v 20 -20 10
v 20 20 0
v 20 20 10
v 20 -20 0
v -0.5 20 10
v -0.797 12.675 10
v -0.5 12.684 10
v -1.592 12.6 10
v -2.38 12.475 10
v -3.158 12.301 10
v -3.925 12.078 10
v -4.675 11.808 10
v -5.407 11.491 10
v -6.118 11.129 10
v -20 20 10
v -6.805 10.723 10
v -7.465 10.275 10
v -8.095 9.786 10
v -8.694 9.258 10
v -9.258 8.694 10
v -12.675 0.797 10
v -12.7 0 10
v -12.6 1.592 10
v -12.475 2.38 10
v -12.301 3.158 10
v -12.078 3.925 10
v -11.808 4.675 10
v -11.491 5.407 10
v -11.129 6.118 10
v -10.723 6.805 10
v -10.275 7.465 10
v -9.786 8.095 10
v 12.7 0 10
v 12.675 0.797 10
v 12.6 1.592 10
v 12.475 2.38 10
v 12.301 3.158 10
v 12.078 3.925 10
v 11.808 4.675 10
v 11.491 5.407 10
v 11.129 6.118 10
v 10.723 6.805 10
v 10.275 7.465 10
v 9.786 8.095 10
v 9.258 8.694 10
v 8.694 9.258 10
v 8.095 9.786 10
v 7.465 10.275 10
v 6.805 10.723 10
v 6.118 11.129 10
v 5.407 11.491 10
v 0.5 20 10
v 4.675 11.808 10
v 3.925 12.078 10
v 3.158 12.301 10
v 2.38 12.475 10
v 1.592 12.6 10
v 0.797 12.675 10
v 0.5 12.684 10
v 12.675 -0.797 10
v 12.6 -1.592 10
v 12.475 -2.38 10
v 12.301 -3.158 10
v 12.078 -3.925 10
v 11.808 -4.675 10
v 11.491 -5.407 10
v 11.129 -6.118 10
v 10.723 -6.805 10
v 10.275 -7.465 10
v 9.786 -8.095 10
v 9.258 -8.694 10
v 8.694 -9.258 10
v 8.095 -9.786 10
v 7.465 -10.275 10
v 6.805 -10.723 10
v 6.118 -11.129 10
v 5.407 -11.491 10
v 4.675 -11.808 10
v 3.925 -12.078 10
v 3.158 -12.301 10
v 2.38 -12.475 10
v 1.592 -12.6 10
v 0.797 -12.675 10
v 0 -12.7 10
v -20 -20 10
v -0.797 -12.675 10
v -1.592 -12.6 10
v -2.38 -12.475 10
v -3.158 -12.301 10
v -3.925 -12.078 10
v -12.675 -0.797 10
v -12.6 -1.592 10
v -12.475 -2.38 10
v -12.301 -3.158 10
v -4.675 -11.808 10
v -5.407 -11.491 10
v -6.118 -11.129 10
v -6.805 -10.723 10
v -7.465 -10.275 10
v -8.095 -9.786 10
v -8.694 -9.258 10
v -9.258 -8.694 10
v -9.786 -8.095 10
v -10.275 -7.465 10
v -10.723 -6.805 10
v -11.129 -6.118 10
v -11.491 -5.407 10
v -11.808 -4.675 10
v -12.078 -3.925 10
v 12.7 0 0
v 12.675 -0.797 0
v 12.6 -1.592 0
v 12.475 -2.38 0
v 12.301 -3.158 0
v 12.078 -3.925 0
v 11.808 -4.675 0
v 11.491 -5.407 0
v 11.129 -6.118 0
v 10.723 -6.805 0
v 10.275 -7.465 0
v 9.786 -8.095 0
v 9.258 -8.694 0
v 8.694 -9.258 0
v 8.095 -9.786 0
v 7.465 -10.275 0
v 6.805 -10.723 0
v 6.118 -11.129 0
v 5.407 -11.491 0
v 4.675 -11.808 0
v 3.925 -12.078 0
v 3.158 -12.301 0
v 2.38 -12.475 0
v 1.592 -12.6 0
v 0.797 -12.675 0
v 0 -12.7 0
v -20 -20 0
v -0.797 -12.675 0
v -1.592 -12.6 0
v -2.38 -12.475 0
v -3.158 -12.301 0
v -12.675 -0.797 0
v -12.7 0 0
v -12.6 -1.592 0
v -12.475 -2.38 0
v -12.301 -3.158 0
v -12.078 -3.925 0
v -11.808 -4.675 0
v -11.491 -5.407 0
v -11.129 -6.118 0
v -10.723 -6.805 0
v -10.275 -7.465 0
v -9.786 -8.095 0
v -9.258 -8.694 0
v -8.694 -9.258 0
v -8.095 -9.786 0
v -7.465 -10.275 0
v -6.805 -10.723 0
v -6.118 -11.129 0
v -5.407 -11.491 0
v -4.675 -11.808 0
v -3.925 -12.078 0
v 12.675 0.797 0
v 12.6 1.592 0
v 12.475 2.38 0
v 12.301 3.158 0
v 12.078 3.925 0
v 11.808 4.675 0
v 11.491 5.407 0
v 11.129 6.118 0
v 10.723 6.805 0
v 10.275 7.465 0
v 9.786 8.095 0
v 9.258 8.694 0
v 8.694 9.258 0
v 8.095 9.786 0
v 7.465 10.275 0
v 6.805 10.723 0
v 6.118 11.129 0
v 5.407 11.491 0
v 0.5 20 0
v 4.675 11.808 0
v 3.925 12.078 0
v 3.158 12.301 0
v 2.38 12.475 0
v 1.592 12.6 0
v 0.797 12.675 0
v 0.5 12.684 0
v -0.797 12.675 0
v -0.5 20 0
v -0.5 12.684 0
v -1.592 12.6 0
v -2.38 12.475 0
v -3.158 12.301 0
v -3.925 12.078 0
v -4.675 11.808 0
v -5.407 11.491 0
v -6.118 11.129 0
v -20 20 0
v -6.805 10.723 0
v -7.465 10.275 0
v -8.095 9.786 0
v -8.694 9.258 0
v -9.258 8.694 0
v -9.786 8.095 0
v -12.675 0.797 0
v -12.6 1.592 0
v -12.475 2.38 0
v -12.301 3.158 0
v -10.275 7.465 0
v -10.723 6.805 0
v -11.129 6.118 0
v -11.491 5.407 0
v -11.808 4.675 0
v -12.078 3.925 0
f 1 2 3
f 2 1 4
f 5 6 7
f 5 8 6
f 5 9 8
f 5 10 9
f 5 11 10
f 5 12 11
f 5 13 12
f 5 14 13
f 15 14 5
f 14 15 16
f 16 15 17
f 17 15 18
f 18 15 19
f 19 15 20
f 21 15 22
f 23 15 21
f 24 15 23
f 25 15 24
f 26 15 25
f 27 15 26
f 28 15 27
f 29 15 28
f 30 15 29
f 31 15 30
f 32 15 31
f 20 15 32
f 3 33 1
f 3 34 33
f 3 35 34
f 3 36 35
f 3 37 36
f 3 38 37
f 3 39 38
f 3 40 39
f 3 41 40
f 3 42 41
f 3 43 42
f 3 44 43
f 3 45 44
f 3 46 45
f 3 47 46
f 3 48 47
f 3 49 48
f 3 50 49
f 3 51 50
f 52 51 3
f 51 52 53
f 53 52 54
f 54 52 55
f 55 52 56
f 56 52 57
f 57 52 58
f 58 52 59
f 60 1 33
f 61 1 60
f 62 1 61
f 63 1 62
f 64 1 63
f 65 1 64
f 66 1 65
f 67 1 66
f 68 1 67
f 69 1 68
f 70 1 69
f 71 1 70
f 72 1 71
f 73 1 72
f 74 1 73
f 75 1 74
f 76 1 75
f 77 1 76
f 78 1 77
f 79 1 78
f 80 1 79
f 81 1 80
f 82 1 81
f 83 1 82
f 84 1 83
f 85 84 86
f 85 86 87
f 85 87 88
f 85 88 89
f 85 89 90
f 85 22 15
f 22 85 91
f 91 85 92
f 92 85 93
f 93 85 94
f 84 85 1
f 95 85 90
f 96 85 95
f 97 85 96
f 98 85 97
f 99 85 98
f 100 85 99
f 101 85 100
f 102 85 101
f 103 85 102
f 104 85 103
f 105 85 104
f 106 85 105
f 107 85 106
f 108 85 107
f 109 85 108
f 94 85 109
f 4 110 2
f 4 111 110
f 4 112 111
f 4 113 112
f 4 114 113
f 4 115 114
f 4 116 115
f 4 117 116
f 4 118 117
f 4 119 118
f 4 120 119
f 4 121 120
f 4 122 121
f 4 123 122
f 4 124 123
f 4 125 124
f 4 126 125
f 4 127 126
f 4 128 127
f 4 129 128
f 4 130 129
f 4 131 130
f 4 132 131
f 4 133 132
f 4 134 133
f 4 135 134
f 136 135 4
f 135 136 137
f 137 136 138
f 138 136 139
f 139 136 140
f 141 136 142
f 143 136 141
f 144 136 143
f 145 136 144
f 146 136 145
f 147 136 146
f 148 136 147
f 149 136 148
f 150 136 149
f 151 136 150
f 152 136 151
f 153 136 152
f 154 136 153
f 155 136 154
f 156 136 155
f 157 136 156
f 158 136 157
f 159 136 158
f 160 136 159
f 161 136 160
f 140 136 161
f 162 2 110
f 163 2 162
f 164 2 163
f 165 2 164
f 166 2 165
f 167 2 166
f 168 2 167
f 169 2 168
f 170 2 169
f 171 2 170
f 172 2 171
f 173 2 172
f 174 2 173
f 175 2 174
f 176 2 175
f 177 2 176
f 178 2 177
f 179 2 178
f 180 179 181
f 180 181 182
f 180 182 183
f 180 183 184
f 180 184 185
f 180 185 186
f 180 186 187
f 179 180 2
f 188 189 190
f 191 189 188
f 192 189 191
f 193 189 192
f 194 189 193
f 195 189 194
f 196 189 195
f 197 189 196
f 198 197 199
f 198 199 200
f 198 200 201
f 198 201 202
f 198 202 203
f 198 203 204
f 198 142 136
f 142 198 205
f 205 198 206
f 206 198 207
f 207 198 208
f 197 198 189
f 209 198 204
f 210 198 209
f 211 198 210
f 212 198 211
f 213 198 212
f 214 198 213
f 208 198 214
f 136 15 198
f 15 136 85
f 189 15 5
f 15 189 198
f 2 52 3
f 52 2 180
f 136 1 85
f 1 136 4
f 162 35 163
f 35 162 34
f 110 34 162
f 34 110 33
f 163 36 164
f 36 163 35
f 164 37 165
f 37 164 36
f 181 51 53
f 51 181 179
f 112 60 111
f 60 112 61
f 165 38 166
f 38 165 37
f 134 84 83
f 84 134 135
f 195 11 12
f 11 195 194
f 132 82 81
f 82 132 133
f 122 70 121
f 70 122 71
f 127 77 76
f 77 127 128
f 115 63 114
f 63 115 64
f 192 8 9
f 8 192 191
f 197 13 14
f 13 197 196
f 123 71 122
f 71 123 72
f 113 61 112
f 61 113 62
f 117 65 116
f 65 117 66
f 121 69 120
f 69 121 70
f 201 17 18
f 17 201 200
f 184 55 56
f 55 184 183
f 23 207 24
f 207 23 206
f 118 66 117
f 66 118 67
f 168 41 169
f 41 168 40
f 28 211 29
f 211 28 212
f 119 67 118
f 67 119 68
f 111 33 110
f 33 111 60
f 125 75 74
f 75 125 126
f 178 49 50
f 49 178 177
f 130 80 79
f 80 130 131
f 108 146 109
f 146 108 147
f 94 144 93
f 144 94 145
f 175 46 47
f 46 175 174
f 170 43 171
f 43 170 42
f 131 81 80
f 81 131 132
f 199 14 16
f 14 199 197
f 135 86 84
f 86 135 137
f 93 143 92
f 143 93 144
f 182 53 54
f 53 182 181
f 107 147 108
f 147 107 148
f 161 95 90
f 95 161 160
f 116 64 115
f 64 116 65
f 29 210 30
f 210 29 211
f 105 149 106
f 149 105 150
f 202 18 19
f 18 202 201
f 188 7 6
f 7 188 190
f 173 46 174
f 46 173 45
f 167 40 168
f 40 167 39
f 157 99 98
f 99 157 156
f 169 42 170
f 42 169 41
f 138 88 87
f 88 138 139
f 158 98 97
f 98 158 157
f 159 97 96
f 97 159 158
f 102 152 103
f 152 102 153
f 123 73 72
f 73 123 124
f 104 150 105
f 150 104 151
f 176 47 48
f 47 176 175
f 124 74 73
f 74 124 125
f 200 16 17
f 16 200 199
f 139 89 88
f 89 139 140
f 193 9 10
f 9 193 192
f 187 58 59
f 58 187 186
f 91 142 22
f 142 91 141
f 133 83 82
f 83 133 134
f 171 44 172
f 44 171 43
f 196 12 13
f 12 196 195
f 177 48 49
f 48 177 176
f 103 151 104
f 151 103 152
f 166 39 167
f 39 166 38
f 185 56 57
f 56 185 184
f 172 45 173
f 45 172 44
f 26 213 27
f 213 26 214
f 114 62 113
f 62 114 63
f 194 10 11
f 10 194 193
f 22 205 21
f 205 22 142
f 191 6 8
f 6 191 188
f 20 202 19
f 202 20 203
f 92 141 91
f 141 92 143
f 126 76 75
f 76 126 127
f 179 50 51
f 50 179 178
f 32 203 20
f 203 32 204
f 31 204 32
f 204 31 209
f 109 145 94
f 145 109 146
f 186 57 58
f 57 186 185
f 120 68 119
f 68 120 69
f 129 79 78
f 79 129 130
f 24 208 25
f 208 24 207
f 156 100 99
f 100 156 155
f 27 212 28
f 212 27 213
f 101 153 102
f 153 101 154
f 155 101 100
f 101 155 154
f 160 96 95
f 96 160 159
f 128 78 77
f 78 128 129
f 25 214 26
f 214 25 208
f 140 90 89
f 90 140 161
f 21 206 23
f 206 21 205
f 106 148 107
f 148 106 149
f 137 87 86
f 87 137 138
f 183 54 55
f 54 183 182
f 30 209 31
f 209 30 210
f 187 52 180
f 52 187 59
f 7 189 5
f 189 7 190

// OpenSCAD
motor_dia = 24.4;
clamp_gap = 1.0;

// precision-related
eps = 0.01;
$fn = 100;

module clamp(thickness) {
    difference() {
        translate([-20, -20, 0])
            cube([40, 40, thickness]);
        cylinder(thickness*3, d=motor_dia+1.0, center=true);
        translate([- clamp_gap / 2, 0, -eps])
            cube([clamp_gap, 20+eps, thickness+2*eps]);
    }
}


clamp(10);
